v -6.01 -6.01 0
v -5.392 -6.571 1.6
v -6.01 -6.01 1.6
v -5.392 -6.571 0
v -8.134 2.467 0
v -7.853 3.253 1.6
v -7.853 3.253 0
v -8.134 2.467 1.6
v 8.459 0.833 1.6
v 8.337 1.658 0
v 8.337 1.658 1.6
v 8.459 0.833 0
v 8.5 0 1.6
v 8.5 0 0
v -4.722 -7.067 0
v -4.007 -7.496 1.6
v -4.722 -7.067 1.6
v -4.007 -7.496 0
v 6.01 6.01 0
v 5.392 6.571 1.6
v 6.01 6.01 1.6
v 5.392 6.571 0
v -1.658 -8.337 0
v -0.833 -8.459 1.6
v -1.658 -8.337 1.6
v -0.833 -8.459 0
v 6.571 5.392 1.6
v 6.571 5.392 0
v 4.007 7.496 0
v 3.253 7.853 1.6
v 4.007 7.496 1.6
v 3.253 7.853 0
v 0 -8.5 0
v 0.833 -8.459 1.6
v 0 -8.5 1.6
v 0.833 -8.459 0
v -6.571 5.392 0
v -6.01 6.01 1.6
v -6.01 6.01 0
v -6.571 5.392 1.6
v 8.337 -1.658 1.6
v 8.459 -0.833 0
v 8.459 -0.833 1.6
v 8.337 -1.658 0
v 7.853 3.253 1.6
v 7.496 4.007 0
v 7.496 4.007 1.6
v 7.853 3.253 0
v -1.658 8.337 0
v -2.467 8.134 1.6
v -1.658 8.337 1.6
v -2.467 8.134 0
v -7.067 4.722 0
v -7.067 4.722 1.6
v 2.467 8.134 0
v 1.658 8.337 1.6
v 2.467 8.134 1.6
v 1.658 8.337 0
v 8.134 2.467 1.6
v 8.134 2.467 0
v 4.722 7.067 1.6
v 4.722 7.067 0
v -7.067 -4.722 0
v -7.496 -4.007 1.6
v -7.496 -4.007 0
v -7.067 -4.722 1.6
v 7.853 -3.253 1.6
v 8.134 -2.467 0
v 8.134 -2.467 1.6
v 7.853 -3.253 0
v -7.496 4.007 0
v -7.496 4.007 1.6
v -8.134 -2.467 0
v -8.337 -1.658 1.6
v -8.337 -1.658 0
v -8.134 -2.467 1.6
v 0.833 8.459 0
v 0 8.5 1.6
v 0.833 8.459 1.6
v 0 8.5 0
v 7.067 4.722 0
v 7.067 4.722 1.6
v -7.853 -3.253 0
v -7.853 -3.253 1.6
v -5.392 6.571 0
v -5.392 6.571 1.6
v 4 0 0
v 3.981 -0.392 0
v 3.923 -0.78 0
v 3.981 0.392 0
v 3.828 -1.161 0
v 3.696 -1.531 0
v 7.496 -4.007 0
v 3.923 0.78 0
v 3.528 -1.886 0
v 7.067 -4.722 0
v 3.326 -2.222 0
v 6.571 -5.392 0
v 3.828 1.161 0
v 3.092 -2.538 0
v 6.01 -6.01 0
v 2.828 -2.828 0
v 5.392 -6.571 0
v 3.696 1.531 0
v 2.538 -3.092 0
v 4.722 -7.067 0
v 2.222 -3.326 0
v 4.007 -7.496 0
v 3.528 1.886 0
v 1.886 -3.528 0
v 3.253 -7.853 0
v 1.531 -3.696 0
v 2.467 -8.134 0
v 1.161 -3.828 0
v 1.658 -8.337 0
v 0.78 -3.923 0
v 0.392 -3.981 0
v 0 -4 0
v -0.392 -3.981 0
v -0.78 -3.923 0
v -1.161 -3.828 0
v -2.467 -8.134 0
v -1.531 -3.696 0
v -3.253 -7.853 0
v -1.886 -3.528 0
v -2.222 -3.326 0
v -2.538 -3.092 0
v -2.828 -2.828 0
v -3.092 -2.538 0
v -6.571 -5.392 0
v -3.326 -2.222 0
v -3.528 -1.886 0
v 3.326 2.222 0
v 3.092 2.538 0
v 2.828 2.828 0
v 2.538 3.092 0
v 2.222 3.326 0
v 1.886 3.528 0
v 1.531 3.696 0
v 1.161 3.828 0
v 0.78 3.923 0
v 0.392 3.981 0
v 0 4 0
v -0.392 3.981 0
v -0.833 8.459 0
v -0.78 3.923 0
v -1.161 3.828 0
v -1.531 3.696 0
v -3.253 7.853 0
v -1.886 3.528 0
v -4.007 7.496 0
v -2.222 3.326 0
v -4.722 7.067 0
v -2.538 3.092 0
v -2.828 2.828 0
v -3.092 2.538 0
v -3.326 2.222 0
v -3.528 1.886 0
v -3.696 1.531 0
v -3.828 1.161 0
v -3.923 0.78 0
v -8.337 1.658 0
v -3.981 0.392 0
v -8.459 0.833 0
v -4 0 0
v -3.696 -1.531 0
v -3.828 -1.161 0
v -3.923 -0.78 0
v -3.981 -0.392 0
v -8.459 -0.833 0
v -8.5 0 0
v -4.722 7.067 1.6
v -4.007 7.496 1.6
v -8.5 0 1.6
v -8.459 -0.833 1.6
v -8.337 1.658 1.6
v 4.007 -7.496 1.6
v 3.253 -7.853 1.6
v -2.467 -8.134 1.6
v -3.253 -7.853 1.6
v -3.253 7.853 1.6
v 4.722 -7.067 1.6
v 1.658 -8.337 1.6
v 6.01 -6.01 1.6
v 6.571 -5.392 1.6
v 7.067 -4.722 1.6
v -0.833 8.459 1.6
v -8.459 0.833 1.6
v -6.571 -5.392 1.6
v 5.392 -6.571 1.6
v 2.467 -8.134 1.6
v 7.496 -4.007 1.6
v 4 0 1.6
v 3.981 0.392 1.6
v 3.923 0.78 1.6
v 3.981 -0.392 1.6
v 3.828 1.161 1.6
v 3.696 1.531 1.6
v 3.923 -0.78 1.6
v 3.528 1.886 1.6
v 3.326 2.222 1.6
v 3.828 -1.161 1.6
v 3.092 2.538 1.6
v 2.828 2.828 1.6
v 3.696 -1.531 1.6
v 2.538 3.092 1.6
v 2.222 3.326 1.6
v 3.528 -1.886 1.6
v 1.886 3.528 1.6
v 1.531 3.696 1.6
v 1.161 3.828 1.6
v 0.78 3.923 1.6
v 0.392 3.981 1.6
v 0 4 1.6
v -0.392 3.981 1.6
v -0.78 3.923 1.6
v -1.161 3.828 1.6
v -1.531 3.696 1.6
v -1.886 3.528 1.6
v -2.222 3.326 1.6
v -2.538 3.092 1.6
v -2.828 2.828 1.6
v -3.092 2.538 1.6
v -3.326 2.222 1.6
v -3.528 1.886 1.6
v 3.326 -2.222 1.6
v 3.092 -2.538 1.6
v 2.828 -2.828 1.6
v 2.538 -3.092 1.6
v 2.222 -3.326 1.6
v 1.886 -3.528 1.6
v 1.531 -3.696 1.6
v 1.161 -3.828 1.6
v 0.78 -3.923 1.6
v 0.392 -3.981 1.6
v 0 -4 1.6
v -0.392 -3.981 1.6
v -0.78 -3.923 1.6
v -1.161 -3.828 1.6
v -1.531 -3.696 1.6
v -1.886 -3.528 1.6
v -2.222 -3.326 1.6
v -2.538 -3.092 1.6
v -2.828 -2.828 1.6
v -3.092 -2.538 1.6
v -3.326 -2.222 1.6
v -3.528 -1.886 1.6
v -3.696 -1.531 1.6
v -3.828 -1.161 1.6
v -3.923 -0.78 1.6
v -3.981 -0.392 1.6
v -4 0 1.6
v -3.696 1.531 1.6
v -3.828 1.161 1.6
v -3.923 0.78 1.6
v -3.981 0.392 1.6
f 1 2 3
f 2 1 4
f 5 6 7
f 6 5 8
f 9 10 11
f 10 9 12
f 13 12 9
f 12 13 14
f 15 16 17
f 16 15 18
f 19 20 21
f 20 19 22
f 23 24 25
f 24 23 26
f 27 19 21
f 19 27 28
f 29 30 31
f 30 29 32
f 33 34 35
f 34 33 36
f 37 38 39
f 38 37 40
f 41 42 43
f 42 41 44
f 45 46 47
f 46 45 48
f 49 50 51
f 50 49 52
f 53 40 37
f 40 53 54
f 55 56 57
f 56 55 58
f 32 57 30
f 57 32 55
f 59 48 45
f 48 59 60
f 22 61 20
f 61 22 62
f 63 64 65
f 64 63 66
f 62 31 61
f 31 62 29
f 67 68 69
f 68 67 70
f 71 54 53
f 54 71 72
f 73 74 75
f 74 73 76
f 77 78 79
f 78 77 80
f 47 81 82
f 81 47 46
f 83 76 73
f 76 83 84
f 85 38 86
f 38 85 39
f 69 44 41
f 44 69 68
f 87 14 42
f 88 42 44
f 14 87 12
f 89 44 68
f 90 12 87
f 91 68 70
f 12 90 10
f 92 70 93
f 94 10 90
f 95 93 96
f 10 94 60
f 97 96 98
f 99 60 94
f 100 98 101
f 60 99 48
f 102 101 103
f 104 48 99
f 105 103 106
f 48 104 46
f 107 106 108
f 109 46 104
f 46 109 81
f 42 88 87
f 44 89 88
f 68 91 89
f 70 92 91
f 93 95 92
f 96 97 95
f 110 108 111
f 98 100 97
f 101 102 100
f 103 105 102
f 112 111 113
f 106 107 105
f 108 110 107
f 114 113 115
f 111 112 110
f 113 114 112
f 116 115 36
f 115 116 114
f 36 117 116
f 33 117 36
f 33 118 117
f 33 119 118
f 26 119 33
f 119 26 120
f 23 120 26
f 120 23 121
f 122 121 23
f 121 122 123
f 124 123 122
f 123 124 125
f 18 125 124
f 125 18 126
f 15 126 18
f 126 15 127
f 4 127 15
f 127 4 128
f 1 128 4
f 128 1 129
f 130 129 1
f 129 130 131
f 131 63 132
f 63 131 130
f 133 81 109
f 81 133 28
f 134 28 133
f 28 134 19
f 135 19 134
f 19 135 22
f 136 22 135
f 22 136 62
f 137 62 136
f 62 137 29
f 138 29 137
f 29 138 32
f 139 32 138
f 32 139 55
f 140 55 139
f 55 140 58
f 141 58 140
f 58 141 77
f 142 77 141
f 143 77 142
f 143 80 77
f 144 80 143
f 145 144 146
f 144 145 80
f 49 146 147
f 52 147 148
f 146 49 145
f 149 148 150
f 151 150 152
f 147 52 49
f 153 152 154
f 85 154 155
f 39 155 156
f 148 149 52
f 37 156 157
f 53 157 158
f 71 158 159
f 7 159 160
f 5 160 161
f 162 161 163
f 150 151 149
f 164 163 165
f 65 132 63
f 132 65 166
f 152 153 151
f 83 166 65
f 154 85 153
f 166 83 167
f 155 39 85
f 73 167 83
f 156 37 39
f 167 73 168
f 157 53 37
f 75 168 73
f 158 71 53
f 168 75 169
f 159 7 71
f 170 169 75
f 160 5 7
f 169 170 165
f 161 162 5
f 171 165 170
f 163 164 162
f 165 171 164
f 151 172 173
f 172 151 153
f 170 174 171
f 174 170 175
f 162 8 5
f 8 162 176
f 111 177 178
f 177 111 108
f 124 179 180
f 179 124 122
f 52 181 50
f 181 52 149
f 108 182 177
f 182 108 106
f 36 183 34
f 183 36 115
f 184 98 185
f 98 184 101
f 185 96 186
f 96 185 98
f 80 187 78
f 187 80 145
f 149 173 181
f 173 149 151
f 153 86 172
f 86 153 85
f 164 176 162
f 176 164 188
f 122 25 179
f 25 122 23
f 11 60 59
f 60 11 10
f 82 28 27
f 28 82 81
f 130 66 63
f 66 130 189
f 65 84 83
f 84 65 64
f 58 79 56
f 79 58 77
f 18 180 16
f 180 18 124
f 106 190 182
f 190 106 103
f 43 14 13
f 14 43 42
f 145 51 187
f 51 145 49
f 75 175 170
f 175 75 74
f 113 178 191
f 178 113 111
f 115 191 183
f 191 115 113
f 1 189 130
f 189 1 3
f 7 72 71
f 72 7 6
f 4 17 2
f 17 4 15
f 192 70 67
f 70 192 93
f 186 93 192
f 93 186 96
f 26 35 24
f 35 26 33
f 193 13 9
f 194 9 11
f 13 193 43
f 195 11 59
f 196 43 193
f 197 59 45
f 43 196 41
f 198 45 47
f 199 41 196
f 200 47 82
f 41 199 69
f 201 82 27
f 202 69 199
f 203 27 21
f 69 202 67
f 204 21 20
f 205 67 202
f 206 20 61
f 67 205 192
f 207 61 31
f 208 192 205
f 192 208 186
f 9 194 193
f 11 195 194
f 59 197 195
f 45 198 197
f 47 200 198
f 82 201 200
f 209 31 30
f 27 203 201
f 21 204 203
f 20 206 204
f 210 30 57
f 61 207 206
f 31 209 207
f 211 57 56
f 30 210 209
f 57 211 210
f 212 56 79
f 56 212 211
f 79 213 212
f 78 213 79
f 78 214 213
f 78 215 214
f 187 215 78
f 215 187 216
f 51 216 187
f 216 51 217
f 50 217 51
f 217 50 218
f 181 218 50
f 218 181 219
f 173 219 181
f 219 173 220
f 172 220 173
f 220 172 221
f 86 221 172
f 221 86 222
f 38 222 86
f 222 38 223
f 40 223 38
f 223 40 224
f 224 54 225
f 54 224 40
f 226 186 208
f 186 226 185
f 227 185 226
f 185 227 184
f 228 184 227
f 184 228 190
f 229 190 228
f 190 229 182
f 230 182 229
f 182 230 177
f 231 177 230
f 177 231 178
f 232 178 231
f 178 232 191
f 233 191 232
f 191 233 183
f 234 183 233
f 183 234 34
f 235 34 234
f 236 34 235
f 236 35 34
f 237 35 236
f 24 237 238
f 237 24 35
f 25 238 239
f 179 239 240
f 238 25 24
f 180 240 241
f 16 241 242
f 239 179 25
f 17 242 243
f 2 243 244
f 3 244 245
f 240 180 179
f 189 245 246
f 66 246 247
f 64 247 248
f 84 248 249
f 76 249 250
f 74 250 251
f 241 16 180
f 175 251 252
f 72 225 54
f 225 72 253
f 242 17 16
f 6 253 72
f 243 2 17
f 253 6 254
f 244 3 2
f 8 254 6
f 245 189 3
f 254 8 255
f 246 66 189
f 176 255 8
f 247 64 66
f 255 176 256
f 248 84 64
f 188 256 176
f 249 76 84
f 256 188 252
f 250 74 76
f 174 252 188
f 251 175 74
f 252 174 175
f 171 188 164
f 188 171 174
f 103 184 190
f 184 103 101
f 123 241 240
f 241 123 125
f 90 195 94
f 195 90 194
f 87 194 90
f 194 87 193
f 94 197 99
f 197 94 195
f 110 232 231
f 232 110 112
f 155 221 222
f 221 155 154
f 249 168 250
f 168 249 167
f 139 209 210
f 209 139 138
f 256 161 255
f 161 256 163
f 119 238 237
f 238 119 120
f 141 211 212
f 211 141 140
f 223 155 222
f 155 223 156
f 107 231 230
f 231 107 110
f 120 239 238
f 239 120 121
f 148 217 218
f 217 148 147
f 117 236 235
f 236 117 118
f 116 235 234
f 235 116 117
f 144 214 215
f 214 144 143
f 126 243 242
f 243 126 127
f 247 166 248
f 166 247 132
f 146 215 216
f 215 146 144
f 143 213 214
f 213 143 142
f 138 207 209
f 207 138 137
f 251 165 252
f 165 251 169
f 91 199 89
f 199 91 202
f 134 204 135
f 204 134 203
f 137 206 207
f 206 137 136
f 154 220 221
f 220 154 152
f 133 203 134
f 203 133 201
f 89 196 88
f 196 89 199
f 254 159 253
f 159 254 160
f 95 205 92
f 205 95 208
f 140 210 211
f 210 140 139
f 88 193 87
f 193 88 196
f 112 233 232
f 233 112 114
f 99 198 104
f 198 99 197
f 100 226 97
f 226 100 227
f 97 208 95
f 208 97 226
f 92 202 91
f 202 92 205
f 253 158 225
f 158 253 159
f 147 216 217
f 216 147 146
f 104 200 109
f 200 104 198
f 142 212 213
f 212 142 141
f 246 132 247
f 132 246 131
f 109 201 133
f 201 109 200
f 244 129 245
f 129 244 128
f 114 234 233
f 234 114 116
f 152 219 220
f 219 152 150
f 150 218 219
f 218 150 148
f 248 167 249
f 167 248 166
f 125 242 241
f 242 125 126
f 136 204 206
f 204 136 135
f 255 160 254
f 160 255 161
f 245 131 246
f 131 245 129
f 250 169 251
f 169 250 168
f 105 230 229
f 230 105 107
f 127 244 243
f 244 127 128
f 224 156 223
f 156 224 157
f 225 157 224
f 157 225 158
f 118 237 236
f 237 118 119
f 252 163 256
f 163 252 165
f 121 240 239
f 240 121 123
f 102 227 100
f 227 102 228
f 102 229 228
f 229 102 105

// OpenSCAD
difference() {
    cylinder(h=1.6, d=17.0, $fn=64);
    translate([0, 0, -0.1])
        cylinder(h=1.8, d=8.0, $fn=64);
}
